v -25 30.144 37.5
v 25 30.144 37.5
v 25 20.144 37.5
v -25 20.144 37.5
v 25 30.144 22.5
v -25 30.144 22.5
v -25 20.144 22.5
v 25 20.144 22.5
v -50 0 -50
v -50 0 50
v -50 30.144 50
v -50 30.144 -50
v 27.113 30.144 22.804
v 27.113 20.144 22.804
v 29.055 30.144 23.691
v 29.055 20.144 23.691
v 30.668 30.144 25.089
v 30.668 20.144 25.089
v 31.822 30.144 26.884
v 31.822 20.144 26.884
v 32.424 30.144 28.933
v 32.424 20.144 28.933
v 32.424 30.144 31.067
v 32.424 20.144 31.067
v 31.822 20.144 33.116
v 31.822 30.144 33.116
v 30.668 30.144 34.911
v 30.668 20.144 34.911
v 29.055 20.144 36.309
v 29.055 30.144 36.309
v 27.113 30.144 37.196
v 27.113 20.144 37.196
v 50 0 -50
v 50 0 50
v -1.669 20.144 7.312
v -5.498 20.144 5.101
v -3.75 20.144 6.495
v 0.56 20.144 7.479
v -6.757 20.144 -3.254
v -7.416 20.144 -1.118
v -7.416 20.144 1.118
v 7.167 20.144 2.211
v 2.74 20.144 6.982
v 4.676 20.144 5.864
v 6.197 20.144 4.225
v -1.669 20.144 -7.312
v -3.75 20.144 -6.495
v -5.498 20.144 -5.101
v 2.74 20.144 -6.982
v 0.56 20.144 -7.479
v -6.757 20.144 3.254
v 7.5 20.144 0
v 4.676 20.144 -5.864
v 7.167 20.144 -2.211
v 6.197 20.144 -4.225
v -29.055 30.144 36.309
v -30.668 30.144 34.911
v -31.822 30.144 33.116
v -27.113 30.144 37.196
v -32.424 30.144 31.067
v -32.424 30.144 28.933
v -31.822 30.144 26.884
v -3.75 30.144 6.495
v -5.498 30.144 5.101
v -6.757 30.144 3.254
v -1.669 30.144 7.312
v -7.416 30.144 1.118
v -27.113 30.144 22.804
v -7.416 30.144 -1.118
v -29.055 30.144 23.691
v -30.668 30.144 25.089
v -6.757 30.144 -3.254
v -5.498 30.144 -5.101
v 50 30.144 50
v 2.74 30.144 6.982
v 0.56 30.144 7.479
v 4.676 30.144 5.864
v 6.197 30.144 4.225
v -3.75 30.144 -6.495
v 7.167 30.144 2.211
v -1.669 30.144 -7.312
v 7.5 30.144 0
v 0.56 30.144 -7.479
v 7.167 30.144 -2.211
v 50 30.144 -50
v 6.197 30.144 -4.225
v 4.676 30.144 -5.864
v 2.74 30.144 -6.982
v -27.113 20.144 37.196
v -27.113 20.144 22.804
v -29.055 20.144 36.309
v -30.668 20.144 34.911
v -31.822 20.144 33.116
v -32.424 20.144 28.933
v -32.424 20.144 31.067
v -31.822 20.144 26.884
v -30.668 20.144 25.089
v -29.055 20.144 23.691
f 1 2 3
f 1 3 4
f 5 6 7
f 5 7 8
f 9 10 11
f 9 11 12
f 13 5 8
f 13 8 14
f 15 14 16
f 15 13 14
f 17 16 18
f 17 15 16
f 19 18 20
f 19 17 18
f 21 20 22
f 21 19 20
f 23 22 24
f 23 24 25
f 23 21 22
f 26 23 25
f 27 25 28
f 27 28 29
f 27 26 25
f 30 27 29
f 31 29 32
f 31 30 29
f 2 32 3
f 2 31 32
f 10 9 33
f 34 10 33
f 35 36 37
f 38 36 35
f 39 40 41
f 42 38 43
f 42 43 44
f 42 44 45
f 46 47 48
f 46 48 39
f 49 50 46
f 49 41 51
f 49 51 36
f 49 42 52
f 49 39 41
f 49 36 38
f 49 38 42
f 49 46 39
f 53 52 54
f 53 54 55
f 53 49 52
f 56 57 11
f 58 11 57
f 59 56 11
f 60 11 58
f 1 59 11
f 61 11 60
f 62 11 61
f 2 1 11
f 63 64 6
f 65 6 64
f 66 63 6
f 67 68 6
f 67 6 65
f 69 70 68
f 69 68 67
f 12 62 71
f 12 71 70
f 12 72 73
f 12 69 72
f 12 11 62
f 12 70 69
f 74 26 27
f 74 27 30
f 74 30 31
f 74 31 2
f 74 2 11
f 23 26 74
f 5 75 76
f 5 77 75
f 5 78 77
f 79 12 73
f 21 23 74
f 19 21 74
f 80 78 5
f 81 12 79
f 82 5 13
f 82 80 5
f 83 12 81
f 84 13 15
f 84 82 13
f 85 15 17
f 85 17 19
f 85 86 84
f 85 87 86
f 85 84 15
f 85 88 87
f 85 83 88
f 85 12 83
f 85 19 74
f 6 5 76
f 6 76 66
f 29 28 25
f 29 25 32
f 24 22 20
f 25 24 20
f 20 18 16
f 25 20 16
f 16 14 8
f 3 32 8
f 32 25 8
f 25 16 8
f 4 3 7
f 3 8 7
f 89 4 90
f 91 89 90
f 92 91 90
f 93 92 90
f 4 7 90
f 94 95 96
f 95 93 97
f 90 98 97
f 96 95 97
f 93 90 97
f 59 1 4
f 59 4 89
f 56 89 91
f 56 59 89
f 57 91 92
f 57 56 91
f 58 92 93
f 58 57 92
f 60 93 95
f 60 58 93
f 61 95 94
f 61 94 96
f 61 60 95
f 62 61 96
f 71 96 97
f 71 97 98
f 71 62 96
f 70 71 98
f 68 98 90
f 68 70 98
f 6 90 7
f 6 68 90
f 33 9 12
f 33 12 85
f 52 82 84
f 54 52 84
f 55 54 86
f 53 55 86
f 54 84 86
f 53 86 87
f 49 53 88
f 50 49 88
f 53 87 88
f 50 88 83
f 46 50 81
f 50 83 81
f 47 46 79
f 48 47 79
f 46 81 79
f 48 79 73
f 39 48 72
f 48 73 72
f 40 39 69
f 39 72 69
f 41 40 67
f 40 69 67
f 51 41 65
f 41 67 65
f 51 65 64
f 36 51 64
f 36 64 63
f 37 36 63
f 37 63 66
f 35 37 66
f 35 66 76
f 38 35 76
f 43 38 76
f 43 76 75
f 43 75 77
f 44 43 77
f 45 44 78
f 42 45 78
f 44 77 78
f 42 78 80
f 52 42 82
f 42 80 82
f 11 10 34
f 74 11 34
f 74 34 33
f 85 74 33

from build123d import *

# Parameters (mm, degrees)
EXTRUDE_1_DEPTH     = 30.144123077
SKETCH_2_W          = 100
SKETCH_2_H          = 100
EXTRUDE_1_2_DEPTH   = 30.144123077
SKETCH_3_R          = 7.5
CUT_EXTRUDE_1_DEPTH = 10
CUT_EXTRUDE_3_DEPTH = 190.231784212


with BuildPart() as part:
    # 草图2 → 凸台-拉伸1 (new body)
    with BuildSketch(Plane(origin=(0, 0, 0), x_dir=(1, 0, 0), z_dir=(0, 1, 0))):
        Polygon((80, 50), (80, -50), (180, -50), align=None)
    extrude(amount=EXTRUDE_1_DEPTH)


with BuildPart() as body_2:
    # 草图2 → Extrude 1 2 (new body)
    with BuildSketch(Plane(origin=(0, 0, 0), x_dir=(1, 0, 0), z_dir=(0, 1, 0))):
        Rectangle(SKETCH_2_W, SKETCH_2_H)
    extrude(amount=EXTRUDE_1_2_DEPTH)

    # 草图3 → 切除-拉伸1 (cut)
    with BuildSketch(Plane(origin=(0, 30.144123077, 0), x_dir=(1, 0, 0), z_dir=(0, 1, 0))):
        Circle(SKETCH_3_R)
        with BuildLine():
            Line((-25, -22.5), (25, -22.5))
            ThreePointArc((25, -22.5), (32.5, -30), (25, -37.5))
            Line((25, -37.5), (-25, -37.5))
            ThreePointArc((-25, -37.5), (-32.5, -30), (-25, -22.5))
        make_face()
    extrude(amount=-CUT_EXTRUDE_1_DEPTH, mode=Mode.SUBTRACT)


with BuildPart() as body_3:
    # 镜向2: mirrored copy
    add(part.part.mirror(Plane(origin=(0, 0, 0), x_dir=(0, 0, 1), z_dir=(1, 0, 0))))


with BuildPart() as cut_extrude_3_tool:
    # 草图6 → 切除-拉伸3 (new, through all)
    with BuildSketch(Plane(origin=(0, 30.144123077, 0), x_dir=(1, 0, 0), z_dir=(0, 1, 0))):
        Polygon((-80, -50), (-80, 50), (-180, -50), align=None)
        Polygon((80, -50), (180, -50), (80, 50), align=None)
    extrude(amount=-CUT_EXTRUDE_3_DEPTH)


with BuildPart() as part_1:
    add(part.part)

    # 切除-拉伸3: cut by cut_extrude_3_tool
    add(cut_extrude_3_tool.part, mode=Mode.SUBTRACT)


with BuildPart() as body_3_1:
    add(body_3.part)

    # 切除-拉伸3: cut by cut_extrude_3_tool
    add(cut_extrude_3_tool.part, mode=Mode.SUBTRACT)


solid = body_2.part
